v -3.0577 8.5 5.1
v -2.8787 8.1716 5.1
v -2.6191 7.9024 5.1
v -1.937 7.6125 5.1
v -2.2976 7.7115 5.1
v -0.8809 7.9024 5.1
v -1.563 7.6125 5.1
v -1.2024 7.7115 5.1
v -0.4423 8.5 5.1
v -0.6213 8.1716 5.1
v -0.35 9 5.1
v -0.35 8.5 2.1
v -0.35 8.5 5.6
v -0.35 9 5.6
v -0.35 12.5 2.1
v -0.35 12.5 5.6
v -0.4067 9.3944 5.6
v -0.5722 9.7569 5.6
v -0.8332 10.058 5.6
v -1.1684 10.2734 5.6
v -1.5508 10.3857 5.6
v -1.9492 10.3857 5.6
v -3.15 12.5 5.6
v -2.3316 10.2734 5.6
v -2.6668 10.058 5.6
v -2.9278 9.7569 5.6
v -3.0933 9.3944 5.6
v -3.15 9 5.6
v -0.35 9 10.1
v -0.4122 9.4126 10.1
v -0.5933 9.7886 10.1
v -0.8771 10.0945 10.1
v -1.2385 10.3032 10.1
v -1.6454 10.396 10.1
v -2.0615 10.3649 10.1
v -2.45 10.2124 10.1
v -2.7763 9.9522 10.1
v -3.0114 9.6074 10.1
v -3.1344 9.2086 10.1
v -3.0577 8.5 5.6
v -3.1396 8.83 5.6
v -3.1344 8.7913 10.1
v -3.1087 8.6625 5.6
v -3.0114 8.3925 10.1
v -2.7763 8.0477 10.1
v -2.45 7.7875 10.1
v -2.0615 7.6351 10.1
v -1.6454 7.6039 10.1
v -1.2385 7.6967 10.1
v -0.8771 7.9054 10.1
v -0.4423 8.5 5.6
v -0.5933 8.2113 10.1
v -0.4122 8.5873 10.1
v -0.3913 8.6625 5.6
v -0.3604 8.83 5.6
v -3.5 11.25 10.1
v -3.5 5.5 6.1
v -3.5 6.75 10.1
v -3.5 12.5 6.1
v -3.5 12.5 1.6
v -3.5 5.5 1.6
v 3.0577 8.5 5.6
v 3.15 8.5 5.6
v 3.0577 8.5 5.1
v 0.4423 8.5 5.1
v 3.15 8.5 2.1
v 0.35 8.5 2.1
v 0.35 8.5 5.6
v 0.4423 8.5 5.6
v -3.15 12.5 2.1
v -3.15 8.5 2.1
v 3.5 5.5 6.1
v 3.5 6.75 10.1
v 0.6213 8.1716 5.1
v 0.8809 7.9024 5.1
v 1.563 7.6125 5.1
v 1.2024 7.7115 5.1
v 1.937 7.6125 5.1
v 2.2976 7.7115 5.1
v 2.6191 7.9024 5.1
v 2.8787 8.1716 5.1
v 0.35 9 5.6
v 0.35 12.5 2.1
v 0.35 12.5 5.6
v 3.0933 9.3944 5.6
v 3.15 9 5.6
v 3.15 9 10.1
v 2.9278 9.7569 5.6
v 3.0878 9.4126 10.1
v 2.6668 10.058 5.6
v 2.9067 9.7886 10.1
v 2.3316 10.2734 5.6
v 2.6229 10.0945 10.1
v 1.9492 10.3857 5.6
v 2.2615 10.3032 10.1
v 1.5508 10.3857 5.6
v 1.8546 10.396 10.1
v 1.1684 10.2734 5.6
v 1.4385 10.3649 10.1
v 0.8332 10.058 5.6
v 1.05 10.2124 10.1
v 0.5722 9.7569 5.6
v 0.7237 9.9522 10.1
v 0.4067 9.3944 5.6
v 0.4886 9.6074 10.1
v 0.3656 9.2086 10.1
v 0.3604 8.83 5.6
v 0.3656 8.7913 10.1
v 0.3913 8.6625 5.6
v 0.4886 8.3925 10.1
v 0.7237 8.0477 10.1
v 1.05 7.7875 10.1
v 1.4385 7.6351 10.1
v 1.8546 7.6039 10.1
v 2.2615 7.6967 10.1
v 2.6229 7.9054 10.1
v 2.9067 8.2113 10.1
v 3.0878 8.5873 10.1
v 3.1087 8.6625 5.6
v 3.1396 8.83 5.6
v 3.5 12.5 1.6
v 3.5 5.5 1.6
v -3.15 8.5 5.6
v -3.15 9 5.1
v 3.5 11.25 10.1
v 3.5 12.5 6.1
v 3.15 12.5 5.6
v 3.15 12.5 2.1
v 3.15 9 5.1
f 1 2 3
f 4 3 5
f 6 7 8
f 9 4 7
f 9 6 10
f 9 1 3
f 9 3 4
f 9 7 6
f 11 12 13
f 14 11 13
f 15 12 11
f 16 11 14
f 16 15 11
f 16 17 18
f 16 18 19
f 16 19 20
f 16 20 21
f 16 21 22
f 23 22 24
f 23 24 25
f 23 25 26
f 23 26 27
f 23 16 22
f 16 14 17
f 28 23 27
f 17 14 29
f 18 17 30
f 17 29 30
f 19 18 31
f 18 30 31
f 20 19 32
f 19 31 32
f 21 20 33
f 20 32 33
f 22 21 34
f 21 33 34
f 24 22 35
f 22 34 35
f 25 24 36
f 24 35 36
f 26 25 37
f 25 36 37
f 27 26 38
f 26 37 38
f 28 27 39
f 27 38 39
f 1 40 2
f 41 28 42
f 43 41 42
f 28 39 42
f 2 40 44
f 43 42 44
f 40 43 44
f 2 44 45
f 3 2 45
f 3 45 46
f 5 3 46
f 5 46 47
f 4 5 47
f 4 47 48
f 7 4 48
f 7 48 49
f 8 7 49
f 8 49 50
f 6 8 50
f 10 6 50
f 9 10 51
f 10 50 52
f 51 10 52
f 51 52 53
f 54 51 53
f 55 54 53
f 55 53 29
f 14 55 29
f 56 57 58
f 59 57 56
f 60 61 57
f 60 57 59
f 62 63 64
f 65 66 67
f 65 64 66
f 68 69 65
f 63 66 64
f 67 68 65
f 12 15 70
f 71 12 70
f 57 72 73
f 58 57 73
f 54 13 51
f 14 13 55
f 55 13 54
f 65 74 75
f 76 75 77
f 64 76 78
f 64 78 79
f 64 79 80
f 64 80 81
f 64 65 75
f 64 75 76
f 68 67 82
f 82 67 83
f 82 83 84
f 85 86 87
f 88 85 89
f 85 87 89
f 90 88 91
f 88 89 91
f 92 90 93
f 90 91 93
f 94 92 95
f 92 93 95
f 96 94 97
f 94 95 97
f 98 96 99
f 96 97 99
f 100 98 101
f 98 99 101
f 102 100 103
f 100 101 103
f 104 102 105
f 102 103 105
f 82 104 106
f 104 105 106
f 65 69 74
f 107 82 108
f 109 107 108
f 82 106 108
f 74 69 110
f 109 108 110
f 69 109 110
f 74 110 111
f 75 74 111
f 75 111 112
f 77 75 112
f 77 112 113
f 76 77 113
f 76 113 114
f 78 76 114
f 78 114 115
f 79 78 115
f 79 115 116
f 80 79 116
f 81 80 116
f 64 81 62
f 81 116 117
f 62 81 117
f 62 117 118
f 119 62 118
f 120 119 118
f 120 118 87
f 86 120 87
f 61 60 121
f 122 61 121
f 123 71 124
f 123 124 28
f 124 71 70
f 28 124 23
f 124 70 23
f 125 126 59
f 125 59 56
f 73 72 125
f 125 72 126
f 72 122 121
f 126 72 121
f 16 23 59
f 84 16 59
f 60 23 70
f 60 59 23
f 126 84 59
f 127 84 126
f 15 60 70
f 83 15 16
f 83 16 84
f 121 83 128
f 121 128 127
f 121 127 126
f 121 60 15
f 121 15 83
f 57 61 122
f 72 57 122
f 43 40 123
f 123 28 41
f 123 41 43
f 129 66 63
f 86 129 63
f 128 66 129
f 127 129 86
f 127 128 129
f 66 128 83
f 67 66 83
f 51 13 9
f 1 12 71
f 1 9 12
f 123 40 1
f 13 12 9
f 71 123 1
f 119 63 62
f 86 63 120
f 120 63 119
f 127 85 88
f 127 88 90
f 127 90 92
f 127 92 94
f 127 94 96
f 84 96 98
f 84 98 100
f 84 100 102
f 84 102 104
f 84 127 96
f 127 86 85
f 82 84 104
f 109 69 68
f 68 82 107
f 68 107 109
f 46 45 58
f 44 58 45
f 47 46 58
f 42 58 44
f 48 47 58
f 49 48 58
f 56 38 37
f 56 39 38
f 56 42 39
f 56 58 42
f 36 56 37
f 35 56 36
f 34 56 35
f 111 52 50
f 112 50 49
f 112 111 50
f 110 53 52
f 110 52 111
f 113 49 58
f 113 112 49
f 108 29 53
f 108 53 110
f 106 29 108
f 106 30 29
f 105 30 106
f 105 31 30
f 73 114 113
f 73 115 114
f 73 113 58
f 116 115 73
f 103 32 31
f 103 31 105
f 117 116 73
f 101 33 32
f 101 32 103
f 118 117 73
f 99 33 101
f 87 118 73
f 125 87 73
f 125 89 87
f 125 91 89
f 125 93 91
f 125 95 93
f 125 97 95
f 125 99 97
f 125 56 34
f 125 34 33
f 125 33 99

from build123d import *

# Parameters (mm, degrees)
SKETCH001_W     = 7
SKETCH001_H     = 7
PAD001_DEPTH    = 8.5
POCKET_DEPTH    = 7
SKETCH003_R     = 1.4
POCKET001_DEPTH = 5
SKETCH004_W     = 2.8
SKETCH004_H     = 3.5
POCKET002_DEPTH = 4


with BuildPart() as part:
    # Sketch001 (on Face1 of CopyFillet) → Pad001 (new body)
    with BuildSketch(Plane.XY.offset(1.6)):
        with Locations((0, 8.999962)):
            Rectangle(SKETCH001_W, SKETCH001_H)
    extrude(amount=PAD001_DEPTH)

    # Sketch002 (on Face2 of Pad001) → Pocket (cut)
    with BuildSketch(Plane(origin=(3.5, 0, 1.6), x_dir=(0, 1, 0), z_dir=(1, 0, 0))):
        Polygon((5.499962, 4.5), (6.749962, 8.5), (5.499962, 8.5), align=None)
        Polygon((11.249962, 8.5), (12.499962, 8.5), (12.499962, 4.5), align=None)
    extrude(amount=-POCKET_DEPTH, mode=Mode.SUBTRACT)

    # Sketch003 (on Face8 of Pocket) → Pocket001 (cut)
    with BuildSketch(Plane.XY.offset(10.1)):
        with Locations((-1.75, 8.999962)):
            Circle(SKETCH003_R)
        with Locations((1.75, 8.999962)):
            Circle(SKETCH003_R)
    extrude(amount=-POCKET001_DEPTH, mode=Mode.SUBTRACT)

    # Sketch004 (on Face6 of Pocket001) → Pocket002 (cut)
    with BuildSketch(Plane(origin=(0, 12.499962, 1.6), x_dir=(-1, 0, 0), z_dir=(0, 1, 0))):
        with Locations((-1.75, 2.25)):
            Rectangle(SKETCH004_W, SKETCH004_H)
        with Locations((1.75, 2.25)):
            Rectangle(SKETCH004_W, SKETCH004_H)
    extrude(amount=-POCKET002_DEPTH, mode=Mode.SUBTRACT)


solid = part.part
